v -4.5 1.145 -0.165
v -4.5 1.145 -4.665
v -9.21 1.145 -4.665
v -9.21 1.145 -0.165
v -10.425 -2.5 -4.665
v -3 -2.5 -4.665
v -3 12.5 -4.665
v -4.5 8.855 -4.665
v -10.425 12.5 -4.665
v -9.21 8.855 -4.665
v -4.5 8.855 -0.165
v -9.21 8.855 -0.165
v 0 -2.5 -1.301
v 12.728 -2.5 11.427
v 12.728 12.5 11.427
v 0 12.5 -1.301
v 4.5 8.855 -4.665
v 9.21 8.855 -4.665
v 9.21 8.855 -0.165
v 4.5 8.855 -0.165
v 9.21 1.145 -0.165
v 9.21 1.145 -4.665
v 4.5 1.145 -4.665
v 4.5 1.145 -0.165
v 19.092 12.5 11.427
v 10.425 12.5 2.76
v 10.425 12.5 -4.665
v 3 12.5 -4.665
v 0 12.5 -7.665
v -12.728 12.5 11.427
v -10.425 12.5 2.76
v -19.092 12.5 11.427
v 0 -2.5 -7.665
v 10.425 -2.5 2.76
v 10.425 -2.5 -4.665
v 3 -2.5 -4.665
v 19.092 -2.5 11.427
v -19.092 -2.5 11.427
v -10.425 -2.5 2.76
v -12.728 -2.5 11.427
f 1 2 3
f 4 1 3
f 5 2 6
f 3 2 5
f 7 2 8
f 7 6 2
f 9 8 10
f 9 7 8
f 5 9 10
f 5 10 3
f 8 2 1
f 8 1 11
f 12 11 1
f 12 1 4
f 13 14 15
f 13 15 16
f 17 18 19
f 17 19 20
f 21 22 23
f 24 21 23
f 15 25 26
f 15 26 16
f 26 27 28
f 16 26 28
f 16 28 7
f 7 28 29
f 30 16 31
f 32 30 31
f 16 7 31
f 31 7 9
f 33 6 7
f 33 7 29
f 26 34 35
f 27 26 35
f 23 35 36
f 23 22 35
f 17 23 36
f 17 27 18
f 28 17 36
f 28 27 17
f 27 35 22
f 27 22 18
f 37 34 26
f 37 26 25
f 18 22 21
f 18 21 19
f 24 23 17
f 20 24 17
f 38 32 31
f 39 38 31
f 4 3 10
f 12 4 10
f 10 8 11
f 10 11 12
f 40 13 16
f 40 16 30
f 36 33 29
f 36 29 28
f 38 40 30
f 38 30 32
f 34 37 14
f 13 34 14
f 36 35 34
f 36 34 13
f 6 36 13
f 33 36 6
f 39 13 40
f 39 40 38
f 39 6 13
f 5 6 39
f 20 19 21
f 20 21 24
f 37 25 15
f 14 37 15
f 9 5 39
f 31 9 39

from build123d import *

# Parameters (mm, degrees)
EXTRUDE_1_DEPTH     = 10
EXTRUDE_2_DEPTH     = 10
SKETCH_5_W          = 3.14
SKETCH_5_H          = 5.14
CUT_EXTRUDE_1_DEPTH = 3
SCALE_1_SCALE       = 1.5


with BuildPart() as part:
    # 스케치2 → 보스-돌출1 (new body)
    with BuildSketch(Plane(origin=(0, 0, 0), x_dir=(1, 0, 0), z_dir=(0, 1, 0))):
        Polygon((8.485281374, -8.485281374), (0, 0), (-8.485281374, -8.485281374), (-12.727922061, -8.485281374), (0, 4.242640687), (12.727922061, -8.485281374), align=None)
    extrude(amount=EXTRUDE_1_DEPTH)

    # 스케치3 → 보스-돌출2 (add)
    with BuildSketch(Plane(origin=(0, 10, 0), x_dir=(1, 0, 0), z_dir=(0, 1, 0))):
        Polygon((-6.949747468, -2.707106781), (-2, 2.242640687), (-6.949747468, 2.242640687), align=None)
        Polygon((2, 2.242640687), (6.949747468, -2.707106781), (6.949747468, 2.242640687), align=None)
    extrude(amount=-EXTRUDE_2_DEPTH)

    # 스케치5 → 컷-돌출1 (cut)
    with BuildSketch(Plane(origin=(0, 0, -2.242640687), x_dir=(-1, 0, 0), z_dir=(0, 0, -1))):
        with Locations((-4.57, 5)):
            Rectangle(SKETCH_5_W, SKETCH_5_H)
        with Locations((4.57, 5)):
            Rectangle(SKETCH_5_W, SKETCH_5_H)
    extrude(amount=-CUT_EXTRUDE_1_DEPTH, mode=Mode.SUBTRACT)


with BuildPart() as part_1:
    # 축척1: scaled about (0, 5, 2.601544192)
    add(part.part.scale(SCALE_1_SCALE).moved(Location((0, -2.5, -1.300772096))))


solid = part_1.part
